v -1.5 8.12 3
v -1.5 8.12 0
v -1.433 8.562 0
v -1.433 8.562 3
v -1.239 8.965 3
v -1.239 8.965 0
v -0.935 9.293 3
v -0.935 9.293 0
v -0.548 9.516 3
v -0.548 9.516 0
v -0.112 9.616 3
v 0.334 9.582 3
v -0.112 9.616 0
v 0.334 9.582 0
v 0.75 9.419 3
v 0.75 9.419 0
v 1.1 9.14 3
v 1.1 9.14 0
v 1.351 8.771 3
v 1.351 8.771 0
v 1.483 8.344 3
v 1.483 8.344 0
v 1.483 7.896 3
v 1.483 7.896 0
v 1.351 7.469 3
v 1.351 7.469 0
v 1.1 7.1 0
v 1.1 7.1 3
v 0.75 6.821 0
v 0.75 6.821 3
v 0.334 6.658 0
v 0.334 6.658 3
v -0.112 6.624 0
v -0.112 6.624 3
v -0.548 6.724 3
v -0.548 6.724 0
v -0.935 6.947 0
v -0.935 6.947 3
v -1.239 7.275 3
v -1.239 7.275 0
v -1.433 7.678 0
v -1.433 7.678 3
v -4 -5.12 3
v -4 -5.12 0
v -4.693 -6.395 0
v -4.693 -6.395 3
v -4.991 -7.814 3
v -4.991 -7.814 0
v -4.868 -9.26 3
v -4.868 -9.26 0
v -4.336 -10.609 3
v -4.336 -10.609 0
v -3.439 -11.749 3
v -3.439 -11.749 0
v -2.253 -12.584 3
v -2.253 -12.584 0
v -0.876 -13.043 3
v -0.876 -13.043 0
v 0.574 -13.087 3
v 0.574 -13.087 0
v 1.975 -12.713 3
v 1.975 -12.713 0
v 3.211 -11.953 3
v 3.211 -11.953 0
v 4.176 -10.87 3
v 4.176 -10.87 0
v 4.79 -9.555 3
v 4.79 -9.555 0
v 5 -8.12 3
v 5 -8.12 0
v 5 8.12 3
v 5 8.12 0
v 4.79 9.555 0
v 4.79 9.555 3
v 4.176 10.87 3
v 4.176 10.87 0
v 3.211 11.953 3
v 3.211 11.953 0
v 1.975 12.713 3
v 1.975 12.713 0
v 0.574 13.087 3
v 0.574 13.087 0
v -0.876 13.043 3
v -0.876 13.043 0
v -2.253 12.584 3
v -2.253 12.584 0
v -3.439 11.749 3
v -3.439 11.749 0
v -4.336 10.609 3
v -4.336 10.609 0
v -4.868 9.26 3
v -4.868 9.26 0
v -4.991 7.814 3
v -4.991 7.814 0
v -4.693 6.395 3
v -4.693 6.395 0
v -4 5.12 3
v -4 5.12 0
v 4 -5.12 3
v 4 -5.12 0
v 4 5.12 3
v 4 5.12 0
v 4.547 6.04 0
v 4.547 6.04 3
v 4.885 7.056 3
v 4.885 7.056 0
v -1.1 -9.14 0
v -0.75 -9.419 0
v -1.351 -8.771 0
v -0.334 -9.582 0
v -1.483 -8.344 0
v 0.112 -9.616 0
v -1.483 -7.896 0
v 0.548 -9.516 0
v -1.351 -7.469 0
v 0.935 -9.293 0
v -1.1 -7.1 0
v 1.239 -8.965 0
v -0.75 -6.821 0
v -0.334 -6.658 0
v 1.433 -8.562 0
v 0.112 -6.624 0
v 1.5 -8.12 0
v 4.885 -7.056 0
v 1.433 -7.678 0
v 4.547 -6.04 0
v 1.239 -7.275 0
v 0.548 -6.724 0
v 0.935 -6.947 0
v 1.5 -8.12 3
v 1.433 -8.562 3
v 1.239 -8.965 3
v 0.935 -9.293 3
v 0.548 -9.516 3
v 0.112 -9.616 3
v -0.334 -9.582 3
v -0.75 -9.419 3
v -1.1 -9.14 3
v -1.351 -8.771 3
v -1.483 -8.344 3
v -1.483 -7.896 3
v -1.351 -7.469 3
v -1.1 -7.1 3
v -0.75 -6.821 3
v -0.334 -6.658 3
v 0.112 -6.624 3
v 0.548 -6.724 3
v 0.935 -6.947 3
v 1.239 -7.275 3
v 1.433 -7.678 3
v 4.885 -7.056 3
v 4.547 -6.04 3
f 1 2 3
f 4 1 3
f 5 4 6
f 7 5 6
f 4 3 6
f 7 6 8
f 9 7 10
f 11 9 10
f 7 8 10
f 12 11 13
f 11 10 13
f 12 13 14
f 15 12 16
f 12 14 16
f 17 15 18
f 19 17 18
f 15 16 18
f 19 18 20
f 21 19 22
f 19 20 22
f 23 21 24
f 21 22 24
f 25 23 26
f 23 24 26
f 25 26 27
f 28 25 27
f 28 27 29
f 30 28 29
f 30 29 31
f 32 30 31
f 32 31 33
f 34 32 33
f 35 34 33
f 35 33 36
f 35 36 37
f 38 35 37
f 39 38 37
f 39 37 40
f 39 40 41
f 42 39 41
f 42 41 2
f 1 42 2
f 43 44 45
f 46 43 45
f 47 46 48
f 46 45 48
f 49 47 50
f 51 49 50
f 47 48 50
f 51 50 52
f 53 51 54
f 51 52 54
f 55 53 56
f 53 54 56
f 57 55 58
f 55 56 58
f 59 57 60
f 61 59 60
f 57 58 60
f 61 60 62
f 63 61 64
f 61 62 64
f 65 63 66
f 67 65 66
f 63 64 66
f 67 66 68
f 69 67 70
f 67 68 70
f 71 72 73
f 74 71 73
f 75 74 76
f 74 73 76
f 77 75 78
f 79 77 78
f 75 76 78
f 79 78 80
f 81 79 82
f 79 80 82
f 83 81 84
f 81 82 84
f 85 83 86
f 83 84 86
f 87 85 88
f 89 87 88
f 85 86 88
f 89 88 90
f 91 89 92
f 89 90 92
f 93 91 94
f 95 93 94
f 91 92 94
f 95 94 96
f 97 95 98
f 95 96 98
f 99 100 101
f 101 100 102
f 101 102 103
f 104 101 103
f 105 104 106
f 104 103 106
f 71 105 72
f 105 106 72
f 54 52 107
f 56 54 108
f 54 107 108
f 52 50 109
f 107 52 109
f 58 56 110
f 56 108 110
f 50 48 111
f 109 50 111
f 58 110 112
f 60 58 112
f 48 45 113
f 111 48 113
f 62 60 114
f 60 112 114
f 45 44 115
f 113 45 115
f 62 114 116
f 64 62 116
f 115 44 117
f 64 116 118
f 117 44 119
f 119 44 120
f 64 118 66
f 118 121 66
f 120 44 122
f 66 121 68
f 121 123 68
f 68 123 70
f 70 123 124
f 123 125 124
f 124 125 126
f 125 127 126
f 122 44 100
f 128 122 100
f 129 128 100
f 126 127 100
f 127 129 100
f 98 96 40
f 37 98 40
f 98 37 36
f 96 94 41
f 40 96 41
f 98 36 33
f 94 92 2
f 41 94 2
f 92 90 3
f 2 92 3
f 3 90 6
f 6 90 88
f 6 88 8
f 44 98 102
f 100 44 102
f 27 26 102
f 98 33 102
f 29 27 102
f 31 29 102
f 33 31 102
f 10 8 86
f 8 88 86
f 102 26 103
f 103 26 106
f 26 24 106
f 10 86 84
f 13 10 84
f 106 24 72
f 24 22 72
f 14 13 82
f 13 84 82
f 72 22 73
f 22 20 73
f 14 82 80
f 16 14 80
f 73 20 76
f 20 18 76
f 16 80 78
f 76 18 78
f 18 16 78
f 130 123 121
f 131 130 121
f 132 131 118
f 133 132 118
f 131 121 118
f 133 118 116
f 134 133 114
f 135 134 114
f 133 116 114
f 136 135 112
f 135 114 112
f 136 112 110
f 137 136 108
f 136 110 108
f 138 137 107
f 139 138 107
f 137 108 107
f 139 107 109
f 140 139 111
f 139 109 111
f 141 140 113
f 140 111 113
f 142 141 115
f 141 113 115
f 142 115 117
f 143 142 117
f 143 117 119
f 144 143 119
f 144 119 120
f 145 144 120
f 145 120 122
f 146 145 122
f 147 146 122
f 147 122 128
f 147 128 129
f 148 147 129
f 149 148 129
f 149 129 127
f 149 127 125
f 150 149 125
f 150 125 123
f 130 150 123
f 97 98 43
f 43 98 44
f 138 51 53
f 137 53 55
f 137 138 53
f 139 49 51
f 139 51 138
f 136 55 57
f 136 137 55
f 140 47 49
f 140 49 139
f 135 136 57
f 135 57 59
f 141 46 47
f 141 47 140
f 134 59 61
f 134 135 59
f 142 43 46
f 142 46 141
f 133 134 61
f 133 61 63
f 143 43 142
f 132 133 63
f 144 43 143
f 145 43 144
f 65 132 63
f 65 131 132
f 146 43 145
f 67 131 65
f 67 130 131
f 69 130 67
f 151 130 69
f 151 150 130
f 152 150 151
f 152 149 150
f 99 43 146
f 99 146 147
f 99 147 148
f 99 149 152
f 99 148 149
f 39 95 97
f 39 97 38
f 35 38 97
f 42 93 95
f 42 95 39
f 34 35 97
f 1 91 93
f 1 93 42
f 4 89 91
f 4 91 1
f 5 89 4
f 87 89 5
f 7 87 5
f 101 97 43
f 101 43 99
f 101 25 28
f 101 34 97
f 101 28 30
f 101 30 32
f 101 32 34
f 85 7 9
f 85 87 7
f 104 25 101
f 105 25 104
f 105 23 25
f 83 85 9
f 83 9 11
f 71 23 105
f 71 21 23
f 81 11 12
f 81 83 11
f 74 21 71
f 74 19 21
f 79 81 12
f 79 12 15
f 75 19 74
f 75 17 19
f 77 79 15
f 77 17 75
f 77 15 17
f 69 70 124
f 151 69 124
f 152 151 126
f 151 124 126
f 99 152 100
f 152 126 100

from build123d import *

# Parameters (mm, degrees)
EXTRUDE_1_DEPTH     = 3
SKETCH_2_R          = 1.5
CUT_EXTRUDE_1_DEPTH = 15.357381377


with BuildPart() as part:
    # 草图1 → 凸台-拉伸1 (new body)
    with BuildSketch(Plane.XY):
        with BuildLine():
            ThreePointArc((-4, 5.12), (0, 3.12), (4, 5.12))
            Line((4, 5.12), (4, 8.12))
            Line((4, 8.12), (-4, 8.12))
            Line((-4, 8.12), (-4, 5.12))
        make_face()
        with BuildLine():
            Line((4, 8.12), (4, 5.12))
            ThreePointArc((4, 5.12), (4.74341649, 6.53886117), (5, 8.12))
            ThreePointArc((5, 8.12), (-1.58113883, 12.86341649), (-4, 5.12))
            Line((-4, 5.12), (-4, 8.12))
            Line((-4, 8.12), (4, 8.12))
        make_face()
        with BuildLine():
            ThreePointArc((-4, -5.12), (0, -3.12), (4, -5.12))
            Line((4, -5.12), (4, 5.12))
            ThreePointArc((4, 5.12), (0, 3.12), (-4, 5.12))
            Line((-4, 5.12), (-4, -5.12))
        make_face()
        with BuildLine():
            Line((4, -5.12), (4, -8.12))
            Line((4, -8.12), (-4, -8.12))
            Line((-4, -8.12), (-4, -5.12))
            ThreePointArc((-4, -5.12), (-1.58113883, -12.86341649), (5, -8.12))
            ThreePointArc((5, -8.12), (4.74341649, -6.53886117), (4, -5.12))
        make_face()
        with BuildLine():
            Line((-4, -8.12), (4, -8.12))
            Line((4, -8.12), (4, -5.12))
            ThreePointArc((4, -5.12), (0, -3.12), (-4, -5.12))
            Line((-4, -5.12), (-4, -8.12))
        make_face()
    extrude(amount=EXTRUDE_1_DEPTH)

    # 草图2 → 切除-拉伸1 (cut, through all)
    with BuildSketch(Plane(origin=(0, 0, 0), x_dir=(-1, 0, 0), z_dir=(0, 0, -1))):
        with Locations((0, 8.12)):
            Circle(SKETCH_2_R)
        with Locations(Location((0, -8.12, 0), (0, 0, 180))):
            Circle(SKETCH_2_R)
    extrude(amount=-CUT_EXTRUDE_1_DEPTH, mode=Mode.SUBTRACT)


solid = part.part
